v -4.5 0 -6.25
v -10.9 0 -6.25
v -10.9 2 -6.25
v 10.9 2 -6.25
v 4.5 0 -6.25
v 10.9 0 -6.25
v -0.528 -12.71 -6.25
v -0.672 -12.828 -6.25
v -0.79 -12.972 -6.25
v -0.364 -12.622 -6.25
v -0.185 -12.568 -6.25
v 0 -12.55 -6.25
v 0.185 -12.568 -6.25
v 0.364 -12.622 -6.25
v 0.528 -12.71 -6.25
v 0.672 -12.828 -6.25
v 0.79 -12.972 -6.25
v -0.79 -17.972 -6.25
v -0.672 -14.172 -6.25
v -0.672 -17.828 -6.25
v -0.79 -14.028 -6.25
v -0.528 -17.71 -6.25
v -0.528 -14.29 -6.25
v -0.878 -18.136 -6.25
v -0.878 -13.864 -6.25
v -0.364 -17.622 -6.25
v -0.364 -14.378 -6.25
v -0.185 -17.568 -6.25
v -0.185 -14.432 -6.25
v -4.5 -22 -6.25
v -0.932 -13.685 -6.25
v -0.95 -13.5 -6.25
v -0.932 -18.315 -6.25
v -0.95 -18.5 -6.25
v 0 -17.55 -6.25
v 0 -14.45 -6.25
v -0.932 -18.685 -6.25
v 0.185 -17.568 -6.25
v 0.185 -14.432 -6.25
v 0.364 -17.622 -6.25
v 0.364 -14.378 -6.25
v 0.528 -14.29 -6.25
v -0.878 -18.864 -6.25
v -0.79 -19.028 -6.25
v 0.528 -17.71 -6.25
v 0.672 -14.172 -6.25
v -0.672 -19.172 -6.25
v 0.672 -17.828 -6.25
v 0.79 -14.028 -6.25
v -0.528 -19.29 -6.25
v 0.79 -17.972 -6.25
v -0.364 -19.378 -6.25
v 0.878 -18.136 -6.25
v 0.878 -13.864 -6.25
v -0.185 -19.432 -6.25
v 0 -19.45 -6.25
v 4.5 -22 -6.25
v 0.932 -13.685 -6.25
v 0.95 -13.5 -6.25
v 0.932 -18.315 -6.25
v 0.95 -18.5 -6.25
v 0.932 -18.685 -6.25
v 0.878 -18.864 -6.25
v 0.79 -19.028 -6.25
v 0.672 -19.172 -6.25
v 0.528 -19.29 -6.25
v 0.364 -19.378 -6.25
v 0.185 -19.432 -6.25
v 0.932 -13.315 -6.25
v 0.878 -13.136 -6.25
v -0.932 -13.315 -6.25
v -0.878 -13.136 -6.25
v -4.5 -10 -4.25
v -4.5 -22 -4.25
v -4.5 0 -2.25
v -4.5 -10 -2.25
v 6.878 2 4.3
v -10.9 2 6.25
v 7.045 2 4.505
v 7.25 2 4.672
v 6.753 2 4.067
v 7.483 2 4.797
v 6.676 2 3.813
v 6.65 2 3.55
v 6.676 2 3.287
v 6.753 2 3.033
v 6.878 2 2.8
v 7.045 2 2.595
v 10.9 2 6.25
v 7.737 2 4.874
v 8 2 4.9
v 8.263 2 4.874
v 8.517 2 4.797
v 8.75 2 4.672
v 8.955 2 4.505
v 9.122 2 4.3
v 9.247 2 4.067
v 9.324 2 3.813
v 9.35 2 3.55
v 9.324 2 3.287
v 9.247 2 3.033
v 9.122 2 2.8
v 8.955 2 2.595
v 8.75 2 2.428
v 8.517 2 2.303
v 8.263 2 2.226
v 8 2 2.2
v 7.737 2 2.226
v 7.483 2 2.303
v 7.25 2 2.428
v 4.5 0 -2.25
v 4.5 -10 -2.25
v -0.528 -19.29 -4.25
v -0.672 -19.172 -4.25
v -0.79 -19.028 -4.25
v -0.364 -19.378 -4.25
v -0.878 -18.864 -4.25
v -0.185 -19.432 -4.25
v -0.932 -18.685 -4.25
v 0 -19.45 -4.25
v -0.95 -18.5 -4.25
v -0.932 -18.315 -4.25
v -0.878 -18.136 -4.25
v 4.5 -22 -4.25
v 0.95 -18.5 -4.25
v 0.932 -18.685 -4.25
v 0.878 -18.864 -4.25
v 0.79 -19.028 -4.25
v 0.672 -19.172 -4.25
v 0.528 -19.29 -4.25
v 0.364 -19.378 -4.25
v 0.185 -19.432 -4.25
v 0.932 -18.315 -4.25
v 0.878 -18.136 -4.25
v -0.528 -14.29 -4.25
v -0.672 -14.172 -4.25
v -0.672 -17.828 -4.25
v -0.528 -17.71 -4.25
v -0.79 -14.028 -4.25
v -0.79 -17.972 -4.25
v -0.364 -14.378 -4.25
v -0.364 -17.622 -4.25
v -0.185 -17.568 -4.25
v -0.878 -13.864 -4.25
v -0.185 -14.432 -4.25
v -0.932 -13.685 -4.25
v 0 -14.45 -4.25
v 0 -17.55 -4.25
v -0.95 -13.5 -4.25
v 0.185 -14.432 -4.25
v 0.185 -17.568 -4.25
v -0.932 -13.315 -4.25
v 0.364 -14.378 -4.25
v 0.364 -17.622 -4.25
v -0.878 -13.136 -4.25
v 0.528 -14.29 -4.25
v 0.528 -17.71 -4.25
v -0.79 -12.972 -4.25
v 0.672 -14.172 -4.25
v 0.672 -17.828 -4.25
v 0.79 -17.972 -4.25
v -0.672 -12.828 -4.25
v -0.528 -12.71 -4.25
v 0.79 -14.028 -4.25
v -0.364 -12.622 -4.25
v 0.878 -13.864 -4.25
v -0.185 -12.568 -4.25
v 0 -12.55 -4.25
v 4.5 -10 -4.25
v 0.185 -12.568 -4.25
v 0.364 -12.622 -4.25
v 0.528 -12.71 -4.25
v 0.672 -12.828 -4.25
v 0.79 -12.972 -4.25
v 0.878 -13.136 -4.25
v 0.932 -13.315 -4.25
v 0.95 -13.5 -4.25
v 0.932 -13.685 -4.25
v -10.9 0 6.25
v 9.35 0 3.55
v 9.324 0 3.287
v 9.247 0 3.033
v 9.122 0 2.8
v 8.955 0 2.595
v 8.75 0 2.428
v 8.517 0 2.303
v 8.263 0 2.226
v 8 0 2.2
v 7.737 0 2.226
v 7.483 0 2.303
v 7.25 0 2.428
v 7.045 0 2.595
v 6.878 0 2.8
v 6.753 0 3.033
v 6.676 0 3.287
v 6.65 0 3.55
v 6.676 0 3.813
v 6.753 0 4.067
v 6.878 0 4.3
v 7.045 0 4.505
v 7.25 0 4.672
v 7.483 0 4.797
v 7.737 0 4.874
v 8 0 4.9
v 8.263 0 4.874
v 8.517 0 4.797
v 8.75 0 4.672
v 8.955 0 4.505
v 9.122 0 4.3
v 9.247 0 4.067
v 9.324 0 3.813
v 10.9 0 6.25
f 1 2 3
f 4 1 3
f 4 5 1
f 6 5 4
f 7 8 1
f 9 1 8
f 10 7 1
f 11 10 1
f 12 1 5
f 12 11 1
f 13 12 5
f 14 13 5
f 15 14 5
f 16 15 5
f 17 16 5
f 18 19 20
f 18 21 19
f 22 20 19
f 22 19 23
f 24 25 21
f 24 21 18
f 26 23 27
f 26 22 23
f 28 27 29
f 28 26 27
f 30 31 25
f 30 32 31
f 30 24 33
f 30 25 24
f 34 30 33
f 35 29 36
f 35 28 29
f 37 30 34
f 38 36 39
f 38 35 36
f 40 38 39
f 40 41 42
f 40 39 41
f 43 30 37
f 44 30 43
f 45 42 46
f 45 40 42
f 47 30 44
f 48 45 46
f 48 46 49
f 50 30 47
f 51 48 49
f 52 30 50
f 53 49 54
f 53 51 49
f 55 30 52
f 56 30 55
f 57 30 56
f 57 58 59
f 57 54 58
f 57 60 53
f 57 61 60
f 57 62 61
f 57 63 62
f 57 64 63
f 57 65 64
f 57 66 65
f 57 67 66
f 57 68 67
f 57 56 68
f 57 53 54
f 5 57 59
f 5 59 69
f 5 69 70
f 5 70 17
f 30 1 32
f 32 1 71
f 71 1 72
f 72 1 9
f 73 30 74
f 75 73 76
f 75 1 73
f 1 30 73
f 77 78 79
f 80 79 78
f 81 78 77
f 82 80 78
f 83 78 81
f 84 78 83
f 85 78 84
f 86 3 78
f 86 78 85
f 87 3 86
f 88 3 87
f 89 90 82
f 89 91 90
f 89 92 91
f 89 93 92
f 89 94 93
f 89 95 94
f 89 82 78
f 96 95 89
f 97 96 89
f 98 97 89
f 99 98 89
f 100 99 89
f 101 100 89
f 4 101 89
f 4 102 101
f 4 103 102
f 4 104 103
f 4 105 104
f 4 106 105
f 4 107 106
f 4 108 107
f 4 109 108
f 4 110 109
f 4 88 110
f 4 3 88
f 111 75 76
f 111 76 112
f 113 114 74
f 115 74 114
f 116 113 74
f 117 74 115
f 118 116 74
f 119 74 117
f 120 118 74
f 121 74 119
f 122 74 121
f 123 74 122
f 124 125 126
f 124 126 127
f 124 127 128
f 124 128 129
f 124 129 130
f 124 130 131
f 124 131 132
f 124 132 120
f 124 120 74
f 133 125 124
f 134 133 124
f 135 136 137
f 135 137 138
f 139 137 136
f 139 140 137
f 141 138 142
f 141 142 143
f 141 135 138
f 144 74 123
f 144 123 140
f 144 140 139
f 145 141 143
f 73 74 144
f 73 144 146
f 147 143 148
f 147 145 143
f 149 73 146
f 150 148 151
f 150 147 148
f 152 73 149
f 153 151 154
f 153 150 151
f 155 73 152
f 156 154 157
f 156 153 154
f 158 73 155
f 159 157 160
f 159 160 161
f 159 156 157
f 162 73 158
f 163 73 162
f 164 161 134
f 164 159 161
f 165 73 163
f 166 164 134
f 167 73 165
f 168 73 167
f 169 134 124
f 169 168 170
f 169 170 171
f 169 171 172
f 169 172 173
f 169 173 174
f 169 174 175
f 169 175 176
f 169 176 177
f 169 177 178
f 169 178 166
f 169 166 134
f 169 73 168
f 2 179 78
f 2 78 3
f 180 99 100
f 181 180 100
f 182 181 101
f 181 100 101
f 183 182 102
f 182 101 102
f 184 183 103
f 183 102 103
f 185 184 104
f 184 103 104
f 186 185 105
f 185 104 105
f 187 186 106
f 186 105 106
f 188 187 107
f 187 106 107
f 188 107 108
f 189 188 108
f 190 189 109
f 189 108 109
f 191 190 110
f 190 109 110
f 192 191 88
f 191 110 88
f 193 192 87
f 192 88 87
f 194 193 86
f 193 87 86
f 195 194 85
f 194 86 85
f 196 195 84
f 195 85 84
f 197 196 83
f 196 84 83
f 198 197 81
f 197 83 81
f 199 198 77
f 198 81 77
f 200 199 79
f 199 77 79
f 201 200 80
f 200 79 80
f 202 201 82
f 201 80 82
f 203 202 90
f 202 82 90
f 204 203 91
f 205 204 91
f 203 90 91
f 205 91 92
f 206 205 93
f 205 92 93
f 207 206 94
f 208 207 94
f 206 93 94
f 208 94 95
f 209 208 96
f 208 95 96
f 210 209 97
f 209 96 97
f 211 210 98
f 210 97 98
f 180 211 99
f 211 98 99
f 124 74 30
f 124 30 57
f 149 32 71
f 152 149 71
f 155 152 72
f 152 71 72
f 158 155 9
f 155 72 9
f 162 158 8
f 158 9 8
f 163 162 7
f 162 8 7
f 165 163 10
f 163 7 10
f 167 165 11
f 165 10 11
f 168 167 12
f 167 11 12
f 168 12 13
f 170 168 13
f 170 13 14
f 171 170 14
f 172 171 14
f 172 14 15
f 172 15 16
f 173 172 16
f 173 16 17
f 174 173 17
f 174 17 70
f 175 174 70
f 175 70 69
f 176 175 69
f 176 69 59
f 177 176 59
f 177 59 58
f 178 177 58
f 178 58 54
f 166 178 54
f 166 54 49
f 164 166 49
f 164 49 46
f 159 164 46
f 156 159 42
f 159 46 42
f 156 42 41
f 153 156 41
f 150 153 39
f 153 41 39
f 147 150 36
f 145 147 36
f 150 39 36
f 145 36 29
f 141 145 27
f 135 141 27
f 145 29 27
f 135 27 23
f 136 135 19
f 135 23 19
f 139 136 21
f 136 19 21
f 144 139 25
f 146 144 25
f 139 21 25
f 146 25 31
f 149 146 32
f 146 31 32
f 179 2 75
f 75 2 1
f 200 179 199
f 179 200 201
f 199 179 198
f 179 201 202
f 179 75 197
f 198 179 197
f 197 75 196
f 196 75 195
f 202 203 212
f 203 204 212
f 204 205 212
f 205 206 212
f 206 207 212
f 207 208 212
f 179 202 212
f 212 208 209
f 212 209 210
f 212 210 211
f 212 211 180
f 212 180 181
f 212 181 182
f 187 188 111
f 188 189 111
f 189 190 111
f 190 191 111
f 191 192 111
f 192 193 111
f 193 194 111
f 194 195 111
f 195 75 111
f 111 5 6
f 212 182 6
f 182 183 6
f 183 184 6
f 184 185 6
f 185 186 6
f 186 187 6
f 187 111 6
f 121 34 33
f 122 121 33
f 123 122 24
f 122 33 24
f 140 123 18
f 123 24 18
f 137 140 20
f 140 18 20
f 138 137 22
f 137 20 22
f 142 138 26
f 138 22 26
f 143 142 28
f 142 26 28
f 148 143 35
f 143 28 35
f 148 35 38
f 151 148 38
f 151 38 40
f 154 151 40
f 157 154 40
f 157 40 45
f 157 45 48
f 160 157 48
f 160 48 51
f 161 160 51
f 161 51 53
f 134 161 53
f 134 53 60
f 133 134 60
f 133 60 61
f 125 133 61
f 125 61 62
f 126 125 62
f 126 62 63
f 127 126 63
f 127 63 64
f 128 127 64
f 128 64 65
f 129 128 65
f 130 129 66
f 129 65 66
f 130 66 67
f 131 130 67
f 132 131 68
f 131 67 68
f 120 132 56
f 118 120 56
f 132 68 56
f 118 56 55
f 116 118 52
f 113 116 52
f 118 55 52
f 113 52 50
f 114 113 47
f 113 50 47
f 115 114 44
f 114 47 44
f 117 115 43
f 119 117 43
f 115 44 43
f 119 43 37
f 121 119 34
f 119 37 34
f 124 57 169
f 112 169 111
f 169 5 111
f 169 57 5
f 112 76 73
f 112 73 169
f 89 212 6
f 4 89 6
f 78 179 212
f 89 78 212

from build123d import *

# Parameters (mm, degrees)
SKETCH1_W           = 21.8
SKETCH1_H           = 12.5
BOSS_EXTRUDE1_DEPTH = 2
CUT_EXTRUDE1_REACH  = 4
SKETCH2_R           = 1.8
SKETCH3_W           = 9
SKETCH3_H           = 2
BOSS_EXTRUDE2_DEPTH = 22
SKETCH4_R           = 0.95
CUT_EXTRUDE2_DEPTH  = 13.5
SKETCH5_R           = 1.8
SKETCH5_R_2         = 1.35
BOSS_EXTRUDE3_DEPTH = 2
SKETCH6_W           = 9
SKETCH6_H           = 2
BOSS_EXTRUDE4_DEPTH = 10


with BuildPart() as part:
    # Sketch1 → Boss-Extrude1 (new body)
    with BuildSketch(Plane(origin=(0, 0, 0), x_dir=(1, 0, 0), z_dir=(0, 1, 0))):
        Rectangle(SKETCH1_W, SKETCH1_H)
    extrude(amount=BOSS_EXTRUDE1_DEPTH)

    # Sketch2 → Cut-Extrude1 (cut, up to next)
    with BuildSketch(Plane(origin=(0, 2, 0), x_dir=(1, 0, 0), z_dir=(0, 1, 0)), mode=Mode.PRIVATE) as cut_extrude1_sk1:
        with Locations((8, -3.55)):
            Circle(SKETCH2_R)
    cut_extrude1_tool1 = extrude(cut_extrude1_sk1.sketch, amount=-CUT_EXTRUDE1_REACH, mode=Mode.PRIVATE) & part.part
    add(cut_extrude1_tool1.solids().sort_by_distance((8, 2, 3.55))[0], mode=Mode.SUBTRACT)

    # Sketch3 → Boss-Extrude2 (add)
    with BuildSketch(Plane.XZ):
        with Locations((0, -5.25)):
            Rectangle(SKETCH3_W, SKETCH3_H)
    extrude(amount=BOSS_EXTRUDE2_DEPTH)

    # Sketch4 → Cut-Extrude2 (cut, through all)
    with BuildSketch(Plane(origin=(0, 0, -6.25), x_dir=(-1, 0, 0), z_dir=(0, 0, -1))):
        with Locations((0, -13.5)):
            Circle(SKETCH4_R)
        with Locations((0, -18.5)):
            Circle(SKETCH4_R)
    extrude(amount=-CUT_EXTRUDE2_DEPTH, mode=Mode.SUBTRACT)

    # Sketch5 → Boss-Extrude3 (add)
    with BuildSketch(Plane(origin=(0, 2, 0), x_dir=(1, 0, 0), z_dir=(0, 1, 0))):
        with Locations((8, -3.55)):
            Circle(SKETCH5_R)
        with Locations((8, -3.55)):
            Circle(SKETCH5_R_2, mode=Mode.SUBTRACT)
    extrude(amount=-BOSS_EXTRUDE3_DEPTH)

    # Sketch6 → Boss-Extrude4 (add)
    with BuildSketch(Plane.XZ):
        with Locations((0, -3.25)):
            Rectangle(SKETCH6_W, SKETCH6_H)
    extrude(amount=BOSS_EXTRUDE4_DEPTH)


solid = part.part
